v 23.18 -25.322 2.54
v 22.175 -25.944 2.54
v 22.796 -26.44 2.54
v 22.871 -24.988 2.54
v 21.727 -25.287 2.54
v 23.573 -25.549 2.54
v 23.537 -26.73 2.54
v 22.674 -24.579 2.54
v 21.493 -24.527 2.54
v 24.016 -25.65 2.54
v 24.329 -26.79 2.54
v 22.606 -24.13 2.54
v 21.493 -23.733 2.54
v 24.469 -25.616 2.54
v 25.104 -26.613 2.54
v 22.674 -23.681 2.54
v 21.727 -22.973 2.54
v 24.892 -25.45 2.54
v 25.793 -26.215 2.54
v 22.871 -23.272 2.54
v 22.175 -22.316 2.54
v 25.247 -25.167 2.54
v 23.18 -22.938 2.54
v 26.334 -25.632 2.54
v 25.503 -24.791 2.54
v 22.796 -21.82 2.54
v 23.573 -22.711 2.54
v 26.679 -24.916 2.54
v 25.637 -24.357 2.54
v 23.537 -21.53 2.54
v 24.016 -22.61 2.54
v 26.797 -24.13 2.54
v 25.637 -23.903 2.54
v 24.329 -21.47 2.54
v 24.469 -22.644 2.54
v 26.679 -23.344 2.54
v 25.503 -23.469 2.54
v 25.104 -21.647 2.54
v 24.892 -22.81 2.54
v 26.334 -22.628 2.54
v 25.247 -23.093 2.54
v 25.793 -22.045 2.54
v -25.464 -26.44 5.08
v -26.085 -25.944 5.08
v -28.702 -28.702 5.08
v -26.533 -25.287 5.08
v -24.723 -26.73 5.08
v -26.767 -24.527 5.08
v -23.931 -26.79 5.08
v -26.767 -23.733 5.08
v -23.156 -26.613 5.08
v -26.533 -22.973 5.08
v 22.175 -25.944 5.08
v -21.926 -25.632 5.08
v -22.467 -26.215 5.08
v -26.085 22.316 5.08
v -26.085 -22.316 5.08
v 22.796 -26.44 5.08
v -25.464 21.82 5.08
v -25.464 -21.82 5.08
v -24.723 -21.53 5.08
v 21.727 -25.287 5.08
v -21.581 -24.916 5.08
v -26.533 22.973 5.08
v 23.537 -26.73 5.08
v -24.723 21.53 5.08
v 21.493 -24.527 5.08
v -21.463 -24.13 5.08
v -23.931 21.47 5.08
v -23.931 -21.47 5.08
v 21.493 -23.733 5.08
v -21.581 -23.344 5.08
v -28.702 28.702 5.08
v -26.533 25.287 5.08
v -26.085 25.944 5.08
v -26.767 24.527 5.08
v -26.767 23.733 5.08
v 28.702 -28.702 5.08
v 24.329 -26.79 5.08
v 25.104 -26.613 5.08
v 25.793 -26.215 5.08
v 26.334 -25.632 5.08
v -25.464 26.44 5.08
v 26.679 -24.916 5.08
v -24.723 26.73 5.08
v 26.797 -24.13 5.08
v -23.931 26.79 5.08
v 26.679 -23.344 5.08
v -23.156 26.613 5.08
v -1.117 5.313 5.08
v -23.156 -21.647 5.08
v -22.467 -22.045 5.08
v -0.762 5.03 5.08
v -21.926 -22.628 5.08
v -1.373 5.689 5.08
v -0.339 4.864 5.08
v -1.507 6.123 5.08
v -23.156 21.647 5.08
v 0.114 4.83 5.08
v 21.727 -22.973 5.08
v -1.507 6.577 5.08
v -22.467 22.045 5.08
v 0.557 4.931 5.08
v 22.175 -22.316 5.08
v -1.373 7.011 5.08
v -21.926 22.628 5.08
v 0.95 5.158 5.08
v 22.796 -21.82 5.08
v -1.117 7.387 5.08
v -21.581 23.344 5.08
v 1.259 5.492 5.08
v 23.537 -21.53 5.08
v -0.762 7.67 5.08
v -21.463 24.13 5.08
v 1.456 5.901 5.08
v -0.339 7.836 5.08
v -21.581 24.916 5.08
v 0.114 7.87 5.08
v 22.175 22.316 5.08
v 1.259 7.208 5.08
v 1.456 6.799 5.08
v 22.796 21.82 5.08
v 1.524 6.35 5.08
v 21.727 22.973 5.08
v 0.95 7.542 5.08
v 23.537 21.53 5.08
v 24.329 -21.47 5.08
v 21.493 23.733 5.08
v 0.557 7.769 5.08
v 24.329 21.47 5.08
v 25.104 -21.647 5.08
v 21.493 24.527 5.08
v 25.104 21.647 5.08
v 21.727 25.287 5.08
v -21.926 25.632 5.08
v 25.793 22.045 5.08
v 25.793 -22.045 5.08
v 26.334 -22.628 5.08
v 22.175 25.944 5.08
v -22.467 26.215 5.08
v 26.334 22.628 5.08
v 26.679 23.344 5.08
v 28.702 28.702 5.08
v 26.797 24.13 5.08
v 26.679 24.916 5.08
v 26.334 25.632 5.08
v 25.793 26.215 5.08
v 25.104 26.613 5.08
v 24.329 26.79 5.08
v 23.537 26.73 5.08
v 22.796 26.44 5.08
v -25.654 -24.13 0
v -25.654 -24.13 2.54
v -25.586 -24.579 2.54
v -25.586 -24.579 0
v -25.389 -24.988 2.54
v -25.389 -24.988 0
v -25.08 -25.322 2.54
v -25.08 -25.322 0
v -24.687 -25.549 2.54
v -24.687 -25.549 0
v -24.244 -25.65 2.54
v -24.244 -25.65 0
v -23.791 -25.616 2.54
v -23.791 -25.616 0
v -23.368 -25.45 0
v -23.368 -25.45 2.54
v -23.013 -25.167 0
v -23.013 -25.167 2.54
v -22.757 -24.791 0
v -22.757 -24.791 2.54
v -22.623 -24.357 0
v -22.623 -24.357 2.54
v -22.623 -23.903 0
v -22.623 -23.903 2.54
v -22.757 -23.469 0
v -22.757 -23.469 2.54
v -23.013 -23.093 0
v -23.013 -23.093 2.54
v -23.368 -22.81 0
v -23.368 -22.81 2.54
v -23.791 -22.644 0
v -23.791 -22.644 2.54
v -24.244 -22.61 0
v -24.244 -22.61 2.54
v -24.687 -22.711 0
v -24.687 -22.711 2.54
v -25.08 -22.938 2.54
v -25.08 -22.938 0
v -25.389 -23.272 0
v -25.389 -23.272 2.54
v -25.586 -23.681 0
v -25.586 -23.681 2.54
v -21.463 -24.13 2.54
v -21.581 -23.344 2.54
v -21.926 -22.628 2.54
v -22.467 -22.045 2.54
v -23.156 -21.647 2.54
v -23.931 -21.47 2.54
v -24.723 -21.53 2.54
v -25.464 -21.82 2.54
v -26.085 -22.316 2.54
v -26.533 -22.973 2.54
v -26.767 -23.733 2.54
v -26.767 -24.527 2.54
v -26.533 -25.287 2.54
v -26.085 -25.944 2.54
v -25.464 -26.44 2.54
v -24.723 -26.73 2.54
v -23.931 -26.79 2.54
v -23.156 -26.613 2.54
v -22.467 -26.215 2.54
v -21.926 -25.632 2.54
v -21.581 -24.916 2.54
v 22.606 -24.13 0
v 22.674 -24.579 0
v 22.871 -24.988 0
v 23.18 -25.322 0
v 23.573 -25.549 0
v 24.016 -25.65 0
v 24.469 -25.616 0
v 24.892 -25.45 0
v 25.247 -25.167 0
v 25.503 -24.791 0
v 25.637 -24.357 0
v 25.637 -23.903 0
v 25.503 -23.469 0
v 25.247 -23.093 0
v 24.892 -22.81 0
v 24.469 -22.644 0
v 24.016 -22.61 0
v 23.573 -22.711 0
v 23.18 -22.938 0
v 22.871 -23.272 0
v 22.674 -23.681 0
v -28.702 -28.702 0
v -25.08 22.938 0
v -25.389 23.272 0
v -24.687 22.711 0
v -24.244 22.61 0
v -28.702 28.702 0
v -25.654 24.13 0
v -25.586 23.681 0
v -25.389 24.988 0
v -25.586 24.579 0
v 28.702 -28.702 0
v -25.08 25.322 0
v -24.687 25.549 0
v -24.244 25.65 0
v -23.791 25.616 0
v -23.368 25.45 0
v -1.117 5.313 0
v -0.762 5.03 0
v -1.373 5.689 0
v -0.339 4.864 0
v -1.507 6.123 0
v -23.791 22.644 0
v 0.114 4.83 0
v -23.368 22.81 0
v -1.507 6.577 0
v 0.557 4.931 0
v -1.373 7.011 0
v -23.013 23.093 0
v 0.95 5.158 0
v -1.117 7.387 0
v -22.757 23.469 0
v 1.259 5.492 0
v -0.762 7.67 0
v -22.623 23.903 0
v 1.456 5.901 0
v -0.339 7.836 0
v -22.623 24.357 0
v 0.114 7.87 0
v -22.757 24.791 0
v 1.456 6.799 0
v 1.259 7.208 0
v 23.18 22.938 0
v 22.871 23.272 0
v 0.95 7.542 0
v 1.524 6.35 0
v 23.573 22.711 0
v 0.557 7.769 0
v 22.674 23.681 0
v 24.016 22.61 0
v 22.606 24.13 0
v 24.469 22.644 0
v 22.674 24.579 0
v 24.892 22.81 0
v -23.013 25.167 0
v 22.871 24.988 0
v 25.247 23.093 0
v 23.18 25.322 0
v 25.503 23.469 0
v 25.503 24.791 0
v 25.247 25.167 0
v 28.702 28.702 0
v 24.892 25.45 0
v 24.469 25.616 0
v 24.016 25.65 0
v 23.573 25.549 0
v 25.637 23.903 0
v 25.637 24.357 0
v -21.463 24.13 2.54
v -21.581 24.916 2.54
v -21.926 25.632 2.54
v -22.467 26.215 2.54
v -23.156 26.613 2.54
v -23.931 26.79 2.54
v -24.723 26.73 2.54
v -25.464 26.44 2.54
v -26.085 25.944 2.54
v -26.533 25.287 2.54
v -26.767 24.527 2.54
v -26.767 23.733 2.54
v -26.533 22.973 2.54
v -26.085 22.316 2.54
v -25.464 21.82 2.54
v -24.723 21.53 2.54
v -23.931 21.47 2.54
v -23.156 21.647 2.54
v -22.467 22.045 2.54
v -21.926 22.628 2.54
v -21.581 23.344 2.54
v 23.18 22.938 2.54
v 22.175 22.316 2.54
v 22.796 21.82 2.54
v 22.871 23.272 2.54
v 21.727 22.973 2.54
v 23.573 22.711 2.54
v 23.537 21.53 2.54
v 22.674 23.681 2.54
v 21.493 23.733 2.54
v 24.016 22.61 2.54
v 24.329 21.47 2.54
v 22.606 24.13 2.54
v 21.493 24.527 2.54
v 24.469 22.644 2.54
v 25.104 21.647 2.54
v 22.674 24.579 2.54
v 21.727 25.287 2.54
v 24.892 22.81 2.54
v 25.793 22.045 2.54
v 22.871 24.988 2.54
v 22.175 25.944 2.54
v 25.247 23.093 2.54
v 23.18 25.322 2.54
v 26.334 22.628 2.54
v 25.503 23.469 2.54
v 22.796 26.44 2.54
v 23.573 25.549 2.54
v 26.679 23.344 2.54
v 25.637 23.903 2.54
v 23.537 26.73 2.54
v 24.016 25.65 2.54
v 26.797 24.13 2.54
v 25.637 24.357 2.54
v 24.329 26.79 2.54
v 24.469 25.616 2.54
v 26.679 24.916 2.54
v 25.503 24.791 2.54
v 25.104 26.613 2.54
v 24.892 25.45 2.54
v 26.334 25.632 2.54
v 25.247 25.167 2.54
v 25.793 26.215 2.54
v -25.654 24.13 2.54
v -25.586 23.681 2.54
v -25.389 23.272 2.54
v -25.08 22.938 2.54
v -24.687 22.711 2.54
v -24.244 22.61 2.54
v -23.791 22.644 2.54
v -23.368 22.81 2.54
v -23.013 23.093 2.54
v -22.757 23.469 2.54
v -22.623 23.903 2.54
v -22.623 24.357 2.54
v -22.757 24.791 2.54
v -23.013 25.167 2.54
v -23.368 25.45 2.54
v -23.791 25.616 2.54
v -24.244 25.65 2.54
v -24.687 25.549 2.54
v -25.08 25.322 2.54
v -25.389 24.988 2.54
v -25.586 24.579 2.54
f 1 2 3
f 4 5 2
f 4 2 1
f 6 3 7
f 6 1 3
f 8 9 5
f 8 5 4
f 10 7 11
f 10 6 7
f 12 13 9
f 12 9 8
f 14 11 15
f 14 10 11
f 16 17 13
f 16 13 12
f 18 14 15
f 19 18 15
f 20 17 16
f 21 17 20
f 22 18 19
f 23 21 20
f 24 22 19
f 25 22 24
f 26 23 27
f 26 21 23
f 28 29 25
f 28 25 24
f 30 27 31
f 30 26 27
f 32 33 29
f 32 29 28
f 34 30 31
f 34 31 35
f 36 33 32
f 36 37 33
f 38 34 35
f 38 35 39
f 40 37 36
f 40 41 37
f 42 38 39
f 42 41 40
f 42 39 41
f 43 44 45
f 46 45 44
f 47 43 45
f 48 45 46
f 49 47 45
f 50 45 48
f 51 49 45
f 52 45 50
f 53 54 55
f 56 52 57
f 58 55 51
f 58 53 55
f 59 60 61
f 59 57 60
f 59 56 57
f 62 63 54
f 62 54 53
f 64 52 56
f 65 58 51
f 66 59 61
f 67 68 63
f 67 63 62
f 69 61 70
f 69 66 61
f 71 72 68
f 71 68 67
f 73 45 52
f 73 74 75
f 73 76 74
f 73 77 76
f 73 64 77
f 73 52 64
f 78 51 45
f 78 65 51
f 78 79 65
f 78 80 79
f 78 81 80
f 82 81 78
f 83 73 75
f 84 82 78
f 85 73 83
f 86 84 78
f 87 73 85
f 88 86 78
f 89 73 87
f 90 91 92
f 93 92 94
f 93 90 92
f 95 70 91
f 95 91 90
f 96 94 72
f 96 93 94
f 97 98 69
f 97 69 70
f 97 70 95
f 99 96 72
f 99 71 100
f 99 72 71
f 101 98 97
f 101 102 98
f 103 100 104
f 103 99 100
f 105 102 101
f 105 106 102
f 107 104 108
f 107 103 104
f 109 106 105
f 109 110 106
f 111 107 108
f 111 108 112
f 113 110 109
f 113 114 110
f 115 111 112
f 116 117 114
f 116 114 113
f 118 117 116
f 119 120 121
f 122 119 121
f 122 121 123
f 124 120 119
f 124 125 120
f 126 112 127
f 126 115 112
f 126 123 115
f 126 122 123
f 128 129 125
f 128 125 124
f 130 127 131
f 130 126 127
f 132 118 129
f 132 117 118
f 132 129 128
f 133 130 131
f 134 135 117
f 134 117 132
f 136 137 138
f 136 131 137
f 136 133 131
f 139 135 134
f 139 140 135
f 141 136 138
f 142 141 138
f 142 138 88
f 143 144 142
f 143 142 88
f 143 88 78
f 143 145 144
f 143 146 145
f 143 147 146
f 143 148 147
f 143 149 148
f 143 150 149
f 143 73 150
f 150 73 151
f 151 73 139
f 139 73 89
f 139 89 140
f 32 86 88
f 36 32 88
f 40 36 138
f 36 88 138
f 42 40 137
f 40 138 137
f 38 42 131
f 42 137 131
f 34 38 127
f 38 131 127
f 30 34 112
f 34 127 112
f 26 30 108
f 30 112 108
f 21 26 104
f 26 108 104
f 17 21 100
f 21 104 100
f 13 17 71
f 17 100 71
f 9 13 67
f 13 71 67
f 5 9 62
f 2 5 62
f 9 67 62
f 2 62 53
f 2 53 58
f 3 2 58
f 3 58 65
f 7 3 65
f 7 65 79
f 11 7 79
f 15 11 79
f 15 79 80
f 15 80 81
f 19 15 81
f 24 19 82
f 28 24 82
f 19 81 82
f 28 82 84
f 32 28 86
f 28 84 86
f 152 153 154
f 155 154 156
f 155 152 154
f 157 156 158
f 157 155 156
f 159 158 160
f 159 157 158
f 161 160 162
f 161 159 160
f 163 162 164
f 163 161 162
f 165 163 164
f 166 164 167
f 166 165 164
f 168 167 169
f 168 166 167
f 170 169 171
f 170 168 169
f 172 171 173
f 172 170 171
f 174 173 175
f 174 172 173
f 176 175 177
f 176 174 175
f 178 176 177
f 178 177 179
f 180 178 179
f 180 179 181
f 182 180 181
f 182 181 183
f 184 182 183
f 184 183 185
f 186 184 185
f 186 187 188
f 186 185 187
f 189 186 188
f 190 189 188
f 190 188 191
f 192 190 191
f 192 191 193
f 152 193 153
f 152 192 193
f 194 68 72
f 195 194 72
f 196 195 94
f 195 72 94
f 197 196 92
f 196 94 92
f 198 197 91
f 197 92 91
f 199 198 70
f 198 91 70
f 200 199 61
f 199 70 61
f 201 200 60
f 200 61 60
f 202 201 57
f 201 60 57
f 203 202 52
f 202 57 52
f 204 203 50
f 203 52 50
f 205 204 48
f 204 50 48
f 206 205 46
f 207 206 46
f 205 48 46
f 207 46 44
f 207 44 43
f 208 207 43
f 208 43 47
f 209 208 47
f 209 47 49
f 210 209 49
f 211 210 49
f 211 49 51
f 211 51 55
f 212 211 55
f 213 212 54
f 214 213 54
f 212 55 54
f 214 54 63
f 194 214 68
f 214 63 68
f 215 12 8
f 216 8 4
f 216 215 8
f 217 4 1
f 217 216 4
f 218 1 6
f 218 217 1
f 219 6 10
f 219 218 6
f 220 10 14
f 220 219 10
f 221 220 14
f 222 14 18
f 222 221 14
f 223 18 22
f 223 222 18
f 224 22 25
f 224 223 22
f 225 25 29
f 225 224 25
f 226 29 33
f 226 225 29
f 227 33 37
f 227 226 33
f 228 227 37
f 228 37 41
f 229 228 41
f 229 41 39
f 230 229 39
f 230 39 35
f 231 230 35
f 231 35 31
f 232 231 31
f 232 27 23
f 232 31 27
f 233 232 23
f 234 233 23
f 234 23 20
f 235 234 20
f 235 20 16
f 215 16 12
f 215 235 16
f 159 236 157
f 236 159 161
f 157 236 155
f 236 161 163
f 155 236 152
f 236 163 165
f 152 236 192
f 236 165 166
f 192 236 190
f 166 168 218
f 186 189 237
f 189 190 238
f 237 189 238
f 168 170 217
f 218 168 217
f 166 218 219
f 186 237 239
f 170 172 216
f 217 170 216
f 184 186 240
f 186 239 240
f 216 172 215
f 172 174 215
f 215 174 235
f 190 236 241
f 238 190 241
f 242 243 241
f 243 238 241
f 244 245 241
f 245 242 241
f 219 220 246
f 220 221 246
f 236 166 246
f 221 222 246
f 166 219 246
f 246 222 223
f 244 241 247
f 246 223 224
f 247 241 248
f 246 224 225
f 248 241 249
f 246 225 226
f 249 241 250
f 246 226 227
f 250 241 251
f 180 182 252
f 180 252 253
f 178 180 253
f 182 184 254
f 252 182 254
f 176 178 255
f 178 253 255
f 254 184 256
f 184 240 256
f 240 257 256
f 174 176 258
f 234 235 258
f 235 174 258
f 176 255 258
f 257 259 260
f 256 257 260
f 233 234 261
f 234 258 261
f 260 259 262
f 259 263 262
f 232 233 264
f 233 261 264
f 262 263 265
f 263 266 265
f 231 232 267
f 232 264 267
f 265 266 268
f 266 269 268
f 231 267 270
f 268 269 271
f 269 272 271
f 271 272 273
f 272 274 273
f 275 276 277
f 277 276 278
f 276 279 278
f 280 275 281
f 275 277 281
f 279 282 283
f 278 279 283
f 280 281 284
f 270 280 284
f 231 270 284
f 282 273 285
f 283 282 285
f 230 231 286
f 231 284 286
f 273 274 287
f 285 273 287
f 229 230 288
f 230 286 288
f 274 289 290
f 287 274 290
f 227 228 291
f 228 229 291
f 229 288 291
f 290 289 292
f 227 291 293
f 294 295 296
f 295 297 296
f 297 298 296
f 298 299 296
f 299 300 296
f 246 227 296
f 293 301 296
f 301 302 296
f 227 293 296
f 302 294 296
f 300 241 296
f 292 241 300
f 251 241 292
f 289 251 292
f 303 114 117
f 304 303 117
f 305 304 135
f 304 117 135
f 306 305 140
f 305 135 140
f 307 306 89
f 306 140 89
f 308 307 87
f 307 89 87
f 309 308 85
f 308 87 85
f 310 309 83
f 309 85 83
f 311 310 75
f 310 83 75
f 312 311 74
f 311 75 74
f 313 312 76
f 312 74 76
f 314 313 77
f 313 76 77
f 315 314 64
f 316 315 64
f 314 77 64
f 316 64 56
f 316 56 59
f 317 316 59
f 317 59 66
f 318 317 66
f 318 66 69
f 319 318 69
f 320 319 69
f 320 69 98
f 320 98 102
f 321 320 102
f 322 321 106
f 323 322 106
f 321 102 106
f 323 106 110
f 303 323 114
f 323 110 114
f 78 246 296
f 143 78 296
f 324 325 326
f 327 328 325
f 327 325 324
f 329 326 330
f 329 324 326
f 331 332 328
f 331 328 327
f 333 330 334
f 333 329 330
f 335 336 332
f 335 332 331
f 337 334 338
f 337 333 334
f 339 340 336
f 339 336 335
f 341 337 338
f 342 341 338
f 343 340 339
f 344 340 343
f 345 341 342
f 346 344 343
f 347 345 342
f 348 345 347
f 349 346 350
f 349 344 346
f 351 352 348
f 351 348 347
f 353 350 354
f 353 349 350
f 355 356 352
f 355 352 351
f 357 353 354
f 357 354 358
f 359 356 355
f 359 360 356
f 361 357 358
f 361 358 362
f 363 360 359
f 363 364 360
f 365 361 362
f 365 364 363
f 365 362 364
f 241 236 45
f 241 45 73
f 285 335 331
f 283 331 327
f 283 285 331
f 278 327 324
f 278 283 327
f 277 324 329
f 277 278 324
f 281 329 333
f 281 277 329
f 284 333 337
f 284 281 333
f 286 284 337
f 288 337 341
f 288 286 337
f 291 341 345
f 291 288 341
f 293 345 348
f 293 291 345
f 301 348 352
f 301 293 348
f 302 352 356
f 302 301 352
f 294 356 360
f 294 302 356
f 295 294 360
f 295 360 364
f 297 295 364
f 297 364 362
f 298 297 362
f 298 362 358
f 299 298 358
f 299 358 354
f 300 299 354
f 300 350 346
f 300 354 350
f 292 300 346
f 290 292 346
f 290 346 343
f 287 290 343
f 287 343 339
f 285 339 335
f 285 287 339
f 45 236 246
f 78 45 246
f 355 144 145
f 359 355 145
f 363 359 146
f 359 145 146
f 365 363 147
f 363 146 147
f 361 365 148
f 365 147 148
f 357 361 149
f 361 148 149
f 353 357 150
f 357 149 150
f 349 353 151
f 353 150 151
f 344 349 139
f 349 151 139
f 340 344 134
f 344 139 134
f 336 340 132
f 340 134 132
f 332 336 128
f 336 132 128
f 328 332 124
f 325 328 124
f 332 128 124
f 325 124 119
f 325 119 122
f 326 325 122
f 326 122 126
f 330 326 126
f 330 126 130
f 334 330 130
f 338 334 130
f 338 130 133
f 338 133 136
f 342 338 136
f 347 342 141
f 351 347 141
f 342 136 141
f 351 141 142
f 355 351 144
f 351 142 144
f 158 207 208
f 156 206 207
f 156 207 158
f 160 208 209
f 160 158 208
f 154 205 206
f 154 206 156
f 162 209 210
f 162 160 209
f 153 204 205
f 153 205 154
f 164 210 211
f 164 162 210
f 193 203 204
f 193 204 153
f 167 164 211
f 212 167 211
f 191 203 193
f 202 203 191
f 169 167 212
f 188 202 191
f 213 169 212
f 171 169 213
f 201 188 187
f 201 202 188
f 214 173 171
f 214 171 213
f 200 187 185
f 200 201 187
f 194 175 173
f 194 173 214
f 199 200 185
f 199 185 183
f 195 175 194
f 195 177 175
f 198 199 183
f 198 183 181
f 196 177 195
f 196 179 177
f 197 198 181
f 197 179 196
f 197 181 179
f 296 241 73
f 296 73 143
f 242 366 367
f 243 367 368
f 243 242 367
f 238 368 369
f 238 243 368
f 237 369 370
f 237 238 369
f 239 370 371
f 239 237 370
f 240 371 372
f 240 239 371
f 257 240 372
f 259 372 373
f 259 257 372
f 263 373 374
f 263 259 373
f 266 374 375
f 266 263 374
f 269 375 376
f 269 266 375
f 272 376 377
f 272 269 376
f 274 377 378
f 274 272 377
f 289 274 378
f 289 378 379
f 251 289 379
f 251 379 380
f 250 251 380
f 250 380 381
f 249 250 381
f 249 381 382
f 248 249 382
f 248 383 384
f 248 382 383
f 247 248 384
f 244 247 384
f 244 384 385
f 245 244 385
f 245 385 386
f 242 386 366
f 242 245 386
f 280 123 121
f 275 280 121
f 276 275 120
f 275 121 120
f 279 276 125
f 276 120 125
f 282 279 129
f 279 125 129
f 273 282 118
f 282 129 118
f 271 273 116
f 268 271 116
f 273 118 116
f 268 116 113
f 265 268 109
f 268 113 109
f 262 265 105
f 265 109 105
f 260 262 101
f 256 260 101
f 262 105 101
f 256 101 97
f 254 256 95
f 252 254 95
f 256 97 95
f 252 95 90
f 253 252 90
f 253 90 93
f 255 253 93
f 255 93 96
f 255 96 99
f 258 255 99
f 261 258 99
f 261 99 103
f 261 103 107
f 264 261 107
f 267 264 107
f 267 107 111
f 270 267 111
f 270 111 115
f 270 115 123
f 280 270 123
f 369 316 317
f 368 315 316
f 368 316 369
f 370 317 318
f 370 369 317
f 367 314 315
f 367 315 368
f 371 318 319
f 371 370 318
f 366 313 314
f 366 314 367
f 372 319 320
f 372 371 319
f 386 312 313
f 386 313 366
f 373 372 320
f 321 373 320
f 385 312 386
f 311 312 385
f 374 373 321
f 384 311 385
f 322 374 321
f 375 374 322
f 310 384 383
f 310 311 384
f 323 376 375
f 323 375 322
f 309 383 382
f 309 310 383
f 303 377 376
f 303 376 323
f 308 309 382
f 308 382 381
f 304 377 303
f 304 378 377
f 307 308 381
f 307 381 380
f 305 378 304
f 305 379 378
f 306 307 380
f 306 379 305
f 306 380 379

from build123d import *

# Parameters (mm, degrees)
SKETCH1_W           = 57.404
SKETCH1_H           = 57.404
SKETCH1_R           = 1.524
BOSS_EXTRUDE1_DEPTH = 5.08
SKETCH2_R           = 2.667
CUT_EXTRUDE1_DEPTH  = 2.54
SKETCH3_R           = 1.524
CUT_EXTRUDE2_DEPTH  = 41.90740774


with BuildPart() as part:
    # Sketch1 → Boss-Extrude1 (new body)
    with BuildSketch(Plane.XY):
        Rectangle(SKETCH1_W, SKETCH1_H)
        with Locations(Location((-24.13, 24.13, 0), (0, 0, 180))):
            Circle(SKETCH1_R, mode=Mode.SUBTRACT)
        with Locations(Location((-24.13, -24.13, 0), (0, 0, 180))):
            Circle(SKETCH1_R, mode=Mode.SUBTRACT)
        with Locations(Location((24.13, -24.13, 0), (0, 0, 180))):
            Circle(SKETCH1_R, mode=Mode.SUBTRACT)
        with Locations(Location((24.13, 24.13, 0), (0, 0, 180))):
            Circle(SKETCH1_R, mode=Mode.SUBTRACT)
    extrude(amount=BOSS_EXTRUDE1_DEPTH)

    # Sketch2 → Cut-Extrude1 (cut)
    with BuildSketch(Plane.XY.offset(5.08)):
        with Locations((-24.13, -24.13)):
            Circle(SKETCH2_R)
        with Locations((-24.13, 24.13)):
            Circle(SKETCH2_R)
        with Locations((24.13, 24.13)):
            Circle(SKETCH2_R)
        with Locations((24.13, -24.13)):
            Circle(SKETCH2_R)
    extrude(amount=-CUT_EXTRUDE1_DEPTH, mode=Mode.SUBTRACT)

    # Sketch3 → Cut-Extrude2 (cut, through all)
    with BuildSketch(Plane.XY.offset(5.08)):
        with Locations((0, 6.35)):
            Circle(SKETCH3_R)
    extrude(amount=-CUT_EXTRUDE2_DEPTH, mode=Mode.SUBTRACT)


solid = part.part
